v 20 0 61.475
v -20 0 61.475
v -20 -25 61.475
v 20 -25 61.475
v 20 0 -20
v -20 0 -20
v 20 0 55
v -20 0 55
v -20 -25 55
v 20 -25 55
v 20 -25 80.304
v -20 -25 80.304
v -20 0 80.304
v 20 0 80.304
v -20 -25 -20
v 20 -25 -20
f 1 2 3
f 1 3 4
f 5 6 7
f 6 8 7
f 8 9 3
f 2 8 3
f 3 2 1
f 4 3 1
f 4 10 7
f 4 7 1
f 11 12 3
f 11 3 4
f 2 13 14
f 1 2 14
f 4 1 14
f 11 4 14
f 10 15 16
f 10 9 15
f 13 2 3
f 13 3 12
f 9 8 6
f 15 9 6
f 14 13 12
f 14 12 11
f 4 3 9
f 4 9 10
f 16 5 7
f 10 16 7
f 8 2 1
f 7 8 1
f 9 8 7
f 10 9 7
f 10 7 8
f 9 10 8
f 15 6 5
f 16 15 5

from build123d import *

# Parameters (mm, degrees)
F0_W     = 40
F0_H     = 18.829
F1_DEPTH = 25
F0_H_2   = 6.475
F2_DEPTH = 25
F3_DEPTH = 25


with BuildPart() as f1:
    # F0 (on Front) → F1 (new body)
    with BuildSketch(Plane.XZ):
        with Locations((0, 70.8895)):
            Rectangle(F0_W, F0_H)
    extrude(amount=F1_DEPTH)


with BuildPart() as f2:
    # F0 (on Front) → F2 (new body)
    with BuildSketch(Plane.XZ):
        with Locations((0, 58.2375)):
            Rectangle(F0_W, F0_H_2)
    extrude(amount=F2_DEPTH)


with BuildPart() as f3:
    # F0 (on Front) → F3 (new body)
    with BuildSketch(Plane.XZ):
        Polygon((-20, -20), (0, -20), (20, -20), (20, 55), (-20, 55), align=None)
    extrude(amount=F3_DEPTH)


solid = Compound([f1.part, f2.part, f3.part])
